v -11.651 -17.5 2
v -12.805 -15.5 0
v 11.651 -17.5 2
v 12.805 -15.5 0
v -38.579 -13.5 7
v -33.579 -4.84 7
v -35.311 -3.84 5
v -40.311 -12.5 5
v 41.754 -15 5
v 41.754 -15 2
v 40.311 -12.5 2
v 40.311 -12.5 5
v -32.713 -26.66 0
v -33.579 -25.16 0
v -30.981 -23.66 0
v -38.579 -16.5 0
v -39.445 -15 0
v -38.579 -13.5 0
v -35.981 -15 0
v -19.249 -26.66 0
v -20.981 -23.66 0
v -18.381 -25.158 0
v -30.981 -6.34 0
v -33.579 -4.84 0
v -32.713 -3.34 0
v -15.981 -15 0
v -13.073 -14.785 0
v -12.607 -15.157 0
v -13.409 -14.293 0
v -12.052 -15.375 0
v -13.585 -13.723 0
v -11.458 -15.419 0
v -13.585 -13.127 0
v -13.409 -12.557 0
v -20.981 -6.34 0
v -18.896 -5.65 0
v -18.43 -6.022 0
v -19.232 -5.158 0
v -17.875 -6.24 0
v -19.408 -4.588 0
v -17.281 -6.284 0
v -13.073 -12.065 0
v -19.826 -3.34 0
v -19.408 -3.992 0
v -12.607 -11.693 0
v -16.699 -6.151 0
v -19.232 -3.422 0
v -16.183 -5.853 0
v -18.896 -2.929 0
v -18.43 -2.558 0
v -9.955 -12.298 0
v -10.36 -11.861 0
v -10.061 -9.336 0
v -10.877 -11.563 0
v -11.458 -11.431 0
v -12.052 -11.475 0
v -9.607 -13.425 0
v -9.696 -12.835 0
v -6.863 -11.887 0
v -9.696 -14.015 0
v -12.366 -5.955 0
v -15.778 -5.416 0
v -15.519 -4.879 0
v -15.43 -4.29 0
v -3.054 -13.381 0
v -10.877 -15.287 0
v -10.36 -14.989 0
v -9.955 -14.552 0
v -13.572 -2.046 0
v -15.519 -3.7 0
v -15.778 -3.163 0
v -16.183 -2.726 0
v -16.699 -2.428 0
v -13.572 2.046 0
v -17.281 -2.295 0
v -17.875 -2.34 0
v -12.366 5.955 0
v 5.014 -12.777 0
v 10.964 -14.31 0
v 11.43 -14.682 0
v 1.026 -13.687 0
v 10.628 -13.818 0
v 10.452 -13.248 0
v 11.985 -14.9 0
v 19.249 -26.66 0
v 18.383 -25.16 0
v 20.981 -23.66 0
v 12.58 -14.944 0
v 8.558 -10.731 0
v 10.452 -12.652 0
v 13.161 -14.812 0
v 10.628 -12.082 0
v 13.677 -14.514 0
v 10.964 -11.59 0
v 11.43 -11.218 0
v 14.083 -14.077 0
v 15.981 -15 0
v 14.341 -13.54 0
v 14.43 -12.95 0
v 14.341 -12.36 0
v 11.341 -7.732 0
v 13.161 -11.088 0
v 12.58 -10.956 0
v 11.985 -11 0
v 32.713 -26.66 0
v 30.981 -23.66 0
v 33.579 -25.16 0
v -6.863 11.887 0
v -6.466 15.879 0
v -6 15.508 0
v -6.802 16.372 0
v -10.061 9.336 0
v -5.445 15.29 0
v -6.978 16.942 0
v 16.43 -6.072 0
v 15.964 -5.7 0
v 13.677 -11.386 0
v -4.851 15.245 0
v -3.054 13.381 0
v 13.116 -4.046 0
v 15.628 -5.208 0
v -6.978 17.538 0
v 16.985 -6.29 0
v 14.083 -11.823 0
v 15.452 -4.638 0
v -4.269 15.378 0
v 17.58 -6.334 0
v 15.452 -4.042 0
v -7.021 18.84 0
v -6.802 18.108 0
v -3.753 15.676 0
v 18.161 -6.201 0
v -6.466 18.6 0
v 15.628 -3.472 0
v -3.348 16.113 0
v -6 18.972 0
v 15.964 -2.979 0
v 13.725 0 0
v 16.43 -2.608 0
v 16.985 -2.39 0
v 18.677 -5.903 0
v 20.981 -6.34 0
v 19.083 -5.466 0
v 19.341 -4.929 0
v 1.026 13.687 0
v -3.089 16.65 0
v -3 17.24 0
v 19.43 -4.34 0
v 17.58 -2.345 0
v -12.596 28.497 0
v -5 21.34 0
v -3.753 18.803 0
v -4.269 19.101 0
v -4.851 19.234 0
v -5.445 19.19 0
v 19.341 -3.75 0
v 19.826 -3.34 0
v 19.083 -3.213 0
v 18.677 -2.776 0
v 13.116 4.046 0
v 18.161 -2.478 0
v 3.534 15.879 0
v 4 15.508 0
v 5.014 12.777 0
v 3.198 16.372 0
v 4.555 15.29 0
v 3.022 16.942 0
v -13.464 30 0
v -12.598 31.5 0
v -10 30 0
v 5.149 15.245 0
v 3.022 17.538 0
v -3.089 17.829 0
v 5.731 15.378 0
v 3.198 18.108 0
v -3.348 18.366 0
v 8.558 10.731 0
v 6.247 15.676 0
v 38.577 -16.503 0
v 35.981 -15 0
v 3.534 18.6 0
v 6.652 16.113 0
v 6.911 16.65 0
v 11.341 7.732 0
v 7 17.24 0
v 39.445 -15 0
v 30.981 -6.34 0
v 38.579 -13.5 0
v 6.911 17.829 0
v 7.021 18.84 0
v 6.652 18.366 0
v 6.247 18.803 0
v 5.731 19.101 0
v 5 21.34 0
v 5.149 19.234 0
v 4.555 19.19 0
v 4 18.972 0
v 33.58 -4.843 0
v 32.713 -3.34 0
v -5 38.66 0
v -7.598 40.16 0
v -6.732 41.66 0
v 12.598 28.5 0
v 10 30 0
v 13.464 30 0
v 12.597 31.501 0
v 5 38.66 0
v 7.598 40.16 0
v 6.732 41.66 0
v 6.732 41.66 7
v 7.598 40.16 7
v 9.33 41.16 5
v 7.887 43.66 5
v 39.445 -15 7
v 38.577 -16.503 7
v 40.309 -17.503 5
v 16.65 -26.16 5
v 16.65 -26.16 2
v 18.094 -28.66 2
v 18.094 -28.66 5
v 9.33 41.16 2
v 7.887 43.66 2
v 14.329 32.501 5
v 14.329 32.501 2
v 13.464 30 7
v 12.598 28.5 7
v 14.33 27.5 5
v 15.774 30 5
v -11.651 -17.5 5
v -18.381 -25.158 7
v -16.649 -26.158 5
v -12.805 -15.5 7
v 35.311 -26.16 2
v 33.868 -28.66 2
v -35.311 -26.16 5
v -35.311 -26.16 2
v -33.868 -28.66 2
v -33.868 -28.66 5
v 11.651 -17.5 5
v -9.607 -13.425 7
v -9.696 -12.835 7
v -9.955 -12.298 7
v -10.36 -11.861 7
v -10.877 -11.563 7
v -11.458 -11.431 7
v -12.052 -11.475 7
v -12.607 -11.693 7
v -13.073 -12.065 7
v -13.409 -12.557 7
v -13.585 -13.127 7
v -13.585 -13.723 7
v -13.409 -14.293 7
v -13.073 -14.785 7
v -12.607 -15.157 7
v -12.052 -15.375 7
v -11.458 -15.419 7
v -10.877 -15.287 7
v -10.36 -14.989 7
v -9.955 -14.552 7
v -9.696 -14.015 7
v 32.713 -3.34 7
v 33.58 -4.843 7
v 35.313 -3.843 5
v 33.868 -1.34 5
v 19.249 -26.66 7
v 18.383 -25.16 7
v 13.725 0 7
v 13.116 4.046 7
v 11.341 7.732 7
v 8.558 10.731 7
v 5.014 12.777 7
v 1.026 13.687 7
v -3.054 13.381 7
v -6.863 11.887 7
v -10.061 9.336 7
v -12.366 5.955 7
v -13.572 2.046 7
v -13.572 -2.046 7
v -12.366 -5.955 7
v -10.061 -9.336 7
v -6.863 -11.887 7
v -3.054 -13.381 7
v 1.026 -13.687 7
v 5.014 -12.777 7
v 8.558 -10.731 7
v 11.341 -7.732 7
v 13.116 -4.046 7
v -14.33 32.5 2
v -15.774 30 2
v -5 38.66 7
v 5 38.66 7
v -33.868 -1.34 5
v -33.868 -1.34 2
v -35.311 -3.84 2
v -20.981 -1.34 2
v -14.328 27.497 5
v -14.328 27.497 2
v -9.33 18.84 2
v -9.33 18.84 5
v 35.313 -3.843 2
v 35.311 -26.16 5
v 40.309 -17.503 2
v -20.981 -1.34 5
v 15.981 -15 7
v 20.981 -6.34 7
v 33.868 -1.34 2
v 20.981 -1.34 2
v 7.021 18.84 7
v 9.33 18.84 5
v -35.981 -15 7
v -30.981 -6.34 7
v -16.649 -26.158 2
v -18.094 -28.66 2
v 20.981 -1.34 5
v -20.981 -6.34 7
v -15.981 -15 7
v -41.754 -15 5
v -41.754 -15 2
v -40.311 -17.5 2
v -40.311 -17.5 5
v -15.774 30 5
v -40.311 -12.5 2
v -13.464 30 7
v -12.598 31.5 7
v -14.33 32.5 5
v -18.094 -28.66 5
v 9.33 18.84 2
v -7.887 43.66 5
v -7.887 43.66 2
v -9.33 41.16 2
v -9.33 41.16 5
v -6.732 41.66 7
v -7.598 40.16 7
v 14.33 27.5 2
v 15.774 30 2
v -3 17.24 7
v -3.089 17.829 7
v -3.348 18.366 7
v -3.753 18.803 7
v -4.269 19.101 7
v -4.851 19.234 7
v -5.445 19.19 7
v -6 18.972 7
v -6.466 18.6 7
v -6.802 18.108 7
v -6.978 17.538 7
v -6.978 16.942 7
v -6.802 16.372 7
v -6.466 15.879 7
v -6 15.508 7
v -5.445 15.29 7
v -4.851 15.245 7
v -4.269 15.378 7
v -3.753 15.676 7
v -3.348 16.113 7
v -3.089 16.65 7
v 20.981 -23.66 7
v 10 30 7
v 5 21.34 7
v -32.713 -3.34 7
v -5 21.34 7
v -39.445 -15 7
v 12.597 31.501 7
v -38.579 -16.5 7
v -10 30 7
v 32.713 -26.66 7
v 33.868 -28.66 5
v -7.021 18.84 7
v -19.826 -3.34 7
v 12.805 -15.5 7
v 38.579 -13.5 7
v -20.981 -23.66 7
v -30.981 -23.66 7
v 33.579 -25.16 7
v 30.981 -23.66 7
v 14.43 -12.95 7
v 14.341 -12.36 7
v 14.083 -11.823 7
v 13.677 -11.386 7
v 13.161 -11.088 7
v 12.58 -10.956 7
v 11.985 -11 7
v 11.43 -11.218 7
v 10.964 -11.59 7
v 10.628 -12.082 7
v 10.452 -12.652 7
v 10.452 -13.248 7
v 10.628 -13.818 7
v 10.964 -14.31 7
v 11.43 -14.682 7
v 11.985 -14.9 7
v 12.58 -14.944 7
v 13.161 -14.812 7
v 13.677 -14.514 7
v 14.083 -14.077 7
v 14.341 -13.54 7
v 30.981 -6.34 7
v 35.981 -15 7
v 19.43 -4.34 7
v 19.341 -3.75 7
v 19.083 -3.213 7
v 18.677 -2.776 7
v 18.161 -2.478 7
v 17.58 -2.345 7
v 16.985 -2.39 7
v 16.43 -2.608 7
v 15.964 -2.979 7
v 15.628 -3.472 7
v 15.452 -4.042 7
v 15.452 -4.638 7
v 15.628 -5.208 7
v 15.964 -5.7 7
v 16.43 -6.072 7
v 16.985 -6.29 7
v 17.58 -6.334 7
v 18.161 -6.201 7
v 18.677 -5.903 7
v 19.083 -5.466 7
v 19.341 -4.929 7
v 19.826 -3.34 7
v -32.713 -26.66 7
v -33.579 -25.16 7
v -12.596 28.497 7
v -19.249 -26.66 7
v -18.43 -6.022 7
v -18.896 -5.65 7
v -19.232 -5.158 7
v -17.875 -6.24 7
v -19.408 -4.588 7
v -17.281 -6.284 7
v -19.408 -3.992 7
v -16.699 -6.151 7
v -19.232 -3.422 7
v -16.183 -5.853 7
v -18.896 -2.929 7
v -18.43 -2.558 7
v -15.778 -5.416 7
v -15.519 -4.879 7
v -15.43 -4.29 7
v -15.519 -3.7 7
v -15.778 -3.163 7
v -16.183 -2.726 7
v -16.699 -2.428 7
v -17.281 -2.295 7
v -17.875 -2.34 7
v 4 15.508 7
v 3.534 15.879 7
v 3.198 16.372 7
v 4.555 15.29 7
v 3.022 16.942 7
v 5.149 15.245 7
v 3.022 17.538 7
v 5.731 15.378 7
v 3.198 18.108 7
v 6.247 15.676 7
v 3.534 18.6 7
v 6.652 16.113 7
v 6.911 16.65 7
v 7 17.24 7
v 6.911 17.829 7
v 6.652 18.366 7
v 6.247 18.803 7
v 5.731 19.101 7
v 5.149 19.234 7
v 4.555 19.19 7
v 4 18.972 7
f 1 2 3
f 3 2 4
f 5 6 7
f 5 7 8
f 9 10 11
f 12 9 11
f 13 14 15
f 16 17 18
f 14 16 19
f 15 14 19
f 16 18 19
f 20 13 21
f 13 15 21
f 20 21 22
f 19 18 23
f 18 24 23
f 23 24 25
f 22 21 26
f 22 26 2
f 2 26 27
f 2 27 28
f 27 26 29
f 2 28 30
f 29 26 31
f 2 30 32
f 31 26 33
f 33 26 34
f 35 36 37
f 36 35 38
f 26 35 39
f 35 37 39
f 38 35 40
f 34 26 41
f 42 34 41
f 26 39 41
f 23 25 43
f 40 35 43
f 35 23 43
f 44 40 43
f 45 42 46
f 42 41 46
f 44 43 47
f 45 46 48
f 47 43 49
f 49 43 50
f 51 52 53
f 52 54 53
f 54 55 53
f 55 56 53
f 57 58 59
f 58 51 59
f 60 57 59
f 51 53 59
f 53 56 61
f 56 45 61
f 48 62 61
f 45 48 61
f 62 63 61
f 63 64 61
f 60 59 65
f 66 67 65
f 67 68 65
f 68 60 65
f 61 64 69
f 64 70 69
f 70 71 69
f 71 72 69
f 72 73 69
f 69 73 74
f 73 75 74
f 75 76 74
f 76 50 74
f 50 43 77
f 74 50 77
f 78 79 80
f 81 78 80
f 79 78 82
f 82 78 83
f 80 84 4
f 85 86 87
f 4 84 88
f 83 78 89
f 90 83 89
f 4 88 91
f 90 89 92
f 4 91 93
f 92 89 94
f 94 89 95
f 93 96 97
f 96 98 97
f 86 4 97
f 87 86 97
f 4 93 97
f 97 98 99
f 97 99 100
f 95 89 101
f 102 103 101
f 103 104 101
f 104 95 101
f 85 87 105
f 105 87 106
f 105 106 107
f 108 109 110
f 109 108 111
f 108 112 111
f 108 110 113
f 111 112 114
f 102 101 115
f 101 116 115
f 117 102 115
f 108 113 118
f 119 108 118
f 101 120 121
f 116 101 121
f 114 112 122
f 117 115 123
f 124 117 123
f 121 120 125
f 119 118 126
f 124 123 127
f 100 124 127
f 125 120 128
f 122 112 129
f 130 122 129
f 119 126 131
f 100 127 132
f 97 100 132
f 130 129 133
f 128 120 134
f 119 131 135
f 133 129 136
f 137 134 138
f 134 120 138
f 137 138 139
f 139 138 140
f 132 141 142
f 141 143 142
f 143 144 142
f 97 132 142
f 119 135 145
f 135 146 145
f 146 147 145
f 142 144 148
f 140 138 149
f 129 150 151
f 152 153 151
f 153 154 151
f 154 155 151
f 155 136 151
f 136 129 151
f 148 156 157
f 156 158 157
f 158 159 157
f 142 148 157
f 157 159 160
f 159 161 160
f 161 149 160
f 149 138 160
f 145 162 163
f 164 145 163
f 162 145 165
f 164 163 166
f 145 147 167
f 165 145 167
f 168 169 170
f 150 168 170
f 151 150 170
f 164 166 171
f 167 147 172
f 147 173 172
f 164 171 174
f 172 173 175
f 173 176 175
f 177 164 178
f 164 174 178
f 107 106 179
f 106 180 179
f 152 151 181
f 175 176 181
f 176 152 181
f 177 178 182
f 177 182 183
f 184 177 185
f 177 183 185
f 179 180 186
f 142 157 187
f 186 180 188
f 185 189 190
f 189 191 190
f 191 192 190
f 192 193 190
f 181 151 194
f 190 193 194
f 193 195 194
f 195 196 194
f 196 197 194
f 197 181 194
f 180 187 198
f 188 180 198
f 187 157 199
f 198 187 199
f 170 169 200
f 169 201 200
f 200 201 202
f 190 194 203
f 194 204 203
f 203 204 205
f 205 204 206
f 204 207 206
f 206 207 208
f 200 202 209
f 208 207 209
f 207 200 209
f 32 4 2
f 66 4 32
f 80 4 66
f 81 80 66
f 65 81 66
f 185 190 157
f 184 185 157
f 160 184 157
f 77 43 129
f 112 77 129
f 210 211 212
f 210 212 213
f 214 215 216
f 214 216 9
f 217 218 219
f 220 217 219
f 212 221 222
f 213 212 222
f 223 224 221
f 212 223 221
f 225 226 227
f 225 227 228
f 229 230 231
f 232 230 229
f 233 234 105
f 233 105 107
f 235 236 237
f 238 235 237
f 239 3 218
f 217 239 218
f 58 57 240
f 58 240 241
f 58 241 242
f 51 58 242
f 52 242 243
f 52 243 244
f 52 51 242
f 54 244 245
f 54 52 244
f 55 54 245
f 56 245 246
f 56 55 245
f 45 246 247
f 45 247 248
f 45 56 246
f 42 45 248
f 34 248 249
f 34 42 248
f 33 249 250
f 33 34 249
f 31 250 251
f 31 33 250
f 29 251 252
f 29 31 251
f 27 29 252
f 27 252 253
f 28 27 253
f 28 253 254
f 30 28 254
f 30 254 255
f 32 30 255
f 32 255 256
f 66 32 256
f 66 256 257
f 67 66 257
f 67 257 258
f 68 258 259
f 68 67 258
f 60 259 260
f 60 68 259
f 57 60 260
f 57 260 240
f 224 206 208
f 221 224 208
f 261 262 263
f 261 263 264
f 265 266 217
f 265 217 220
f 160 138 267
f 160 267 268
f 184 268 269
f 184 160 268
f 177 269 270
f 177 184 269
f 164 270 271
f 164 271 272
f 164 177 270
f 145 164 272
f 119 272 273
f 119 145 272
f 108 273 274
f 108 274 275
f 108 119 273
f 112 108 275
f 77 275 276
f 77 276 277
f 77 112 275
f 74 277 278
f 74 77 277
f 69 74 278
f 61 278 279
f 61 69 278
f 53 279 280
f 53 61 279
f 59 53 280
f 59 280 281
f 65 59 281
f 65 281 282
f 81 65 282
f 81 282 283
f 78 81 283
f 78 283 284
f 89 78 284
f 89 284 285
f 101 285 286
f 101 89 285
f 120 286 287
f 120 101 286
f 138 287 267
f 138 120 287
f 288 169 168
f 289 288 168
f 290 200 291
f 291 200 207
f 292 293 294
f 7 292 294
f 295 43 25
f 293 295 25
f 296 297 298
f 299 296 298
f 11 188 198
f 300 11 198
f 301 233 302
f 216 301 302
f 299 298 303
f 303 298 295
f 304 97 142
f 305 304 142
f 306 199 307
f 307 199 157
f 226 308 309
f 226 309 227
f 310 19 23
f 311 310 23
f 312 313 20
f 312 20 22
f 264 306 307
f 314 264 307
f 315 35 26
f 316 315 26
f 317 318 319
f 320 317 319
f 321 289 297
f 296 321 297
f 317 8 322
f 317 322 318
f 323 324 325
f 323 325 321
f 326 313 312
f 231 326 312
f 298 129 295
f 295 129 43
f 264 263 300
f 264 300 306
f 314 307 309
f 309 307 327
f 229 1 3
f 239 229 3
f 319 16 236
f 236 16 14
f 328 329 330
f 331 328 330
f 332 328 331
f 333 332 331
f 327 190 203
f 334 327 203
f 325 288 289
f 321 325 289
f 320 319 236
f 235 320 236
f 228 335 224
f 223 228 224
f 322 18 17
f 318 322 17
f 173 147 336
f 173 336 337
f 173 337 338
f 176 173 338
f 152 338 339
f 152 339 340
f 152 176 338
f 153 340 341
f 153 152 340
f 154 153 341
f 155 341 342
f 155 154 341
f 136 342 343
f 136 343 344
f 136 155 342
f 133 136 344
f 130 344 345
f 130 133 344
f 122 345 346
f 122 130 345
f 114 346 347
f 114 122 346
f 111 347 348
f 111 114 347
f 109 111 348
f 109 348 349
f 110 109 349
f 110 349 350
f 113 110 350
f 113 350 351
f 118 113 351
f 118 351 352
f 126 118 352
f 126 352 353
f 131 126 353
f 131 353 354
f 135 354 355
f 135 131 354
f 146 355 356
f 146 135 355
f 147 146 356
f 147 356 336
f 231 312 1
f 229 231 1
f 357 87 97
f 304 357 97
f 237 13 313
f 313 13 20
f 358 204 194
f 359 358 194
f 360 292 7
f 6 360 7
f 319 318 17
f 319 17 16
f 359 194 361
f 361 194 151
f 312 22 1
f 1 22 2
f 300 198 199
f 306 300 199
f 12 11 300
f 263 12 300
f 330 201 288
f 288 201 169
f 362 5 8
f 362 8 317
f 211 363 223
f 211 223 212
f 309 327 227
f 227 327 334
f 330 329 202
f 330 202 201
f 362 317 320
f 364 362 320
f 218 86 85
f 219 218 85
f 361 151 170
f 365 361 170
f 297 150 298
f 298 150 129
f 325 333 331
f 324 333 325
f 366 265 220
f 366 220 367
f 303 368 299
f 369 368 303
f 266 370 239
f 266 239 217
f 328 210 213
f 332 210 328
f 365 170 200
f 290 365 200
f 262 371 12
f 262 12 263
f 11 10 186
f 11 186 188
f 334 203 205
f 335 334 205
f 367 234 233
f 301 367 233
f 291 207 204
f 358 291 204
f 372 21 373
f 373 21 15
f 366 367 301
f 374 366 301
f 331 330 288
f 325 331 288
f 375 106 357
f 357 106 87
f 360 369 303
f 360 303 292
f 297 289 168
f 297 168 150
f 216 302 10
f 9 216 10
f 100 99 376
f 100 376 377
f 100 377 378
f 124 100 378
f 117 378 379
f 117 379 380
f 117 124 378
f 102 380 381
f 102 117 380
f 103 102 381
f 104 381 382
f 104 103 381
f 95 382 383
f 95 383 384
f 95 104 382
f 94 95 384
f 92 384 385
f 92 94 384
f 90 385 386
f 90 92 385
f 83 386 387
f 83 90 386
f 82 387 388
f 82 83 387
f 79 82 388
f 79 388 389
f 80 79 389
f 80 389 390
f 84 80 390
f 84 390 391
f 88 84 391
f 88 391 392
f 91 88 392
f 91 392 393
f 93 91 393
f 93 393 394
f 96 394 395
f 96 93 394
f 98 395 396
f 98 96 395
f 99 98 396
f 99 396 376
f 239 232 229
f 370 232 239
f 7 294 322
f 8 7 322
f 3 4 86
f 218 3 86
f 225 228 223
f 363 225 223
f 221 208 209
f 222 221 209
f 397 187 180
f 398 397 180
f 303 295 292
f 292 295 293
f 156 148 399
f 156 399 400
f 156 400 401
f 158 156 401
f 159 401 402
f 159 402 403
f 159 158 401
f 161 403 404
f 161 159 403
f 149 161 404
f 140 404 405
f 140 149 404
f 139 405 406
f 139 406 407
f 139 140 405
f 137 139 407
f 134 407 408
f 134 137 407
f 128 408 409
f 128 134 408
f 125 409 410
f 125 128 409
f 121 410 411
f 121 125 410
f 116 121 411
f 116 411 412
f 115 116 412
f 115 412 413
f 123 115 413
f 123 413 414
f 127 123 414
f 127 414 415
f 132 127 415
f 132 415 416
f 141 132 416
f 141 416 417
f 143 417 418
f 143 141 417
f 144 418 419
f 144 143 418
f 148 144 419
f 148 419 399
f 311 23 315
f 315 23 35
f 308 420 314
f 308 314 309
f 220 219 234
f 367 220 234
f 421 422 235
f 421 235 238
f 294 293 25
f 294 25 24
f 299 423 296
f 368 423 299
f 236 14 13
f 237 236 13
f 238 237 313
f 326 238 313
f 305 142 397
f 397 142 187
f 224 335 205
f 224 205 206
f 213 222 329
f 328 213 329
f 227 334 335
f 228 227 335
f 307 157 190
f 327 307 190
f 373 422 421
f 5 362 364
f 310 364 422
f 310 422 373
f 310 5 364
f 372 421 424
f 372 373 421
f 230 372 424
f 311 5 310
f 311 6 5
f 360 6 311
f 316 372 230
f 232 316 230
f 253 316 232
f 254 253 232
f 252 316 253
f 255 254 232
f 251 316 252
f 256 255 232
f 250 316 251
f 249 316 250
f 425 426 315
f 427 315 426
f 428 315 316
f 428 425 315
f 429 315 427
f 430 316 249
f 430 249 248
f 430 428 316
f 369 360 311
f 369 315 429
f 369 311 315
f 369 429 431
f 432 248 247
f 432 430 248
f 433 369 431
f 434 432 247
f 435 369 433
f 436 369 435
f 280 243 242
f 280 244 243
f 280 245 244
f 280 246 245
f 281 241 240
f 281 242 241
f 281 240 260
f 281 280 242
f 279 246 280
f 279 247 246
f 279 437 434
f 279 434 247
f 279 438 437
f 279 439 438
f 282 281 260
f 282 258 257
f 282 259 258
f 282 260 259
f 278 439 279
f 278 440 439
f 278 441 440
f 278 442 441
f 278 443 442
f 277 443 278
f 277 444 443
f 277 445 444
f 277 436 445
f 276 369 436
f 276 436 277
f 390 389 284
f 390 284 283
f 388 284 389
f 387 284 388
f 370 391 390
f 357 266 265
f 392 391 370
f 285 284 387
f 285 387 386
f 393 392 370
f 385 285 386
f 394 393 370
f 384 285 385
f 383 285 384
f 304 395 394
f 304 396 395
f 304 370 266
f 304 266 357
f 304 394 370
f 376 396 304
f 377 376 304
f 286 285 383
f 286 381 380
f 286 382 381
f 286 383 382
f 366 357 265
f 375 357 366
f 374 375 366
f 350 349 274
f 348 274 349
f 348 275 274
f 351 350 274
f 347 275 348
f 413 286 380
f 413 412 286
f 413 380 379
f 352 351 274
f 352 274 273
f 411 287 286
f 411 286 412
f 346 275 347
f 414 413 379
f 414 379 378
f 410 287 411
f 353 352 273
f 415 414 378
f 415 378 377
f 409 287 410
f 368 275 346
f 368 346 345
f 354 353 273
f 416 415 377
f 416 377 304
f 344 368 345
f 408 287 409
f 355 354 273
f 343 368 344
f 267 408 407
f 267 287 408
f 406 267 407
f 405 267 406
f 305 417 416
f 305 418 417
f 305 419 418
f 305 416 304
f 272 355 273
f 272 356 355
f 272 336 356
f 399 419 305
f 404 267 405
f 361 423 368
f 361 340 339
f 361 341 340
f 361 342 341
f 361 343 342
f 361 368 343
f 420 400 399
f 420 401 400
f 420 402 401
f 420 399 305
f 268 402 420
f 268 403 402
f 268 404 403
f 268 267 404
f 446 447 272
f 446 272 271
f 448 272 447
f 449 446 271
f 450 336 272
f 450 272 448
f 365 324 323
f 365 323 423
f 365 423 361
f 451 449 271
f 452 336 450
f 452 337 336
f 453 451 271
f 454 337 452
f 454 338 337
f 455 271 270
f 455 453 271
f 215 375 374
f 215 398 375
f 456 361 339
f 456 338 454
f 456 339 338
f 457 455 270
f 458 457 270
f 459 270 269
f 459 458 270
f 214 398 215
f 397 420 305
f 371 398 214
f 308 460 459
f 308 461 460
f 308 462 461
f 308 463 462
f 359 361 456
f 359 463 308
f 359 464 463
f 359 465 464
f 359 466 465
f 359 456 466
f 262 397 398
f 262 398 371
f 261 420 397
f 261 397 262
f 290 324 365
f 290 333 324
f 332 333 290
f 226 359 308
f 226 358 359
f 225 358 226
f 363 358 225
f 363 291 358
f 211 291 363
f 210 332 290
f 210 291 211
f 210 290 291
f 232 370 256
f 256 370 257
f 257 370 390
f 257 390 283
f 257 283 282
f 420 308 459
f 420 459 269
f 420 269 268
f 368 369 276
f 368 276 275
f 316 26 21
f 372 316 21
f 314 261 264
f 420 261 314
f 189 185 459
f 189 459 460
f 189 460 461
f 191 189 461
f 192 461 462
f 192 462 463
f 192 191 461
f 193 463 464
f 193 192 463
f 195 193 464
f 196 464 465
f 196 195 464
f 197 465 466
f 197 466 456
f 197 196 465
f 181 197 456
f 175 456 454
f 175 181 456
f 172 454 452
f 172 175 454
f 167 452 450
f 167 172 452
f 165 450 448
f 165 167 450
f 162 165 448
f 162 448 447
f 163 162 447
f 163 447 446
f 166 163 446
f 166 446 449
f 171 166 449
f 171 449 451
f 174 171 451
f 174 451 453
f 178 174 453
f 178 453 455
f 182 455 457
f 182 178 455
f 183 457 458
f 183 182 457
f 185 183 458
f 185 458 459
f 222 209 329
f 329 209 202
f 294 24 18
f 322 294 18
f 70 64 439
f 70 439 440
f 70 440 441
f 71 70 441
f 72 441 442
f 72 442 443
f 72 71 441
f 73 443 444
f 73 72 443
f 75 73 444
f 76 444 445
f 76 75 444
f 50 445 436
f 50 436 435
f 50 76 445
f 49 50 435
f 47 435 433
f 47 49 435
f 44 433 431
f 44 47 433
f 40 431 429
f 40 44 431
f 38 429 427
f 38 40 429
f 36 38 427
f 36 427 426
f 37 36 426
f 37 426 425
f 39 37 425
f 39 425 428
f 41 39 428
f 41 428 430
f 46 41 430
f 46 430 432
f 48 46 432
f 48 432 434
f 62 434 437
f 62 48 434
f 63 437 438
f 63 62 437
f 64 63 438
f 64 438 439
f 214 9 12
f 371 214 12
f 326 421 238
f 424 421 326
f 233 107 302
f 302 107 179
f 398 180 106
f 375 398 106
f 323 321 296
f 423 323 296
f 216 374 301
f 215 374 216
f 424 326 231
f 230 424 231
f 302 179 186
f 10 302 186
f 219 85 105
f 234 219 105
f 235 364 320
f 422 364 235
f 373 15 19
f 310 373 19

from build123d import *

# Parameters (mm, degrees)
F0_R     = 2
F0_R_2   = 13.725453
F1_DEPTH = 7
F2_SIZE  = 2


with BuildPart() as f1:
    # F0 (on Top) → F1 (new body)
    with BuildSketch(Plane.XY):
        Polygon((5, 43.660253), (-5, 43.660253), (-7.886752, 43.660253), (-9.330152, 41.160211), (-14.330019, 32.500187), (-15.773503, 30), (-14.328388, 27.496988), (-9.330127, 18.839746), (-20.980762, -1.339746), (-30.980762, -1.339746), (-33.867513, -1.339746), (-35.310889, -3.839746), (-40.310889, -12.5), (-41.754264, -15), (-40.310888, -17.499999), (-35.310888, -26.160254), (-33.867512, -28.660255), (-30.980762, -28.660255), (-20.980762, -28.660255), (-18.094012, -28.660255), (-16.649425, -26.158157), (-11.650635, -17.5), (11.650635, -17.5), (16.650482, -26.159988), (18.094012, -28.660255), (20.980762, -28.660255), (30.980762, -28.660255), (33.867512, -28.660255), (35.310888, -26.160254), (40.309298, -17.502755), (41.754264, -15), (40.310625, -12.499543), (35.312513, -3.84256), (33.867513, -1.339746), (30.980762, -1.339746), (20.980762, -1.339746), (9.330127, 18.839746), (14.330123, 27.499994), (15.773503, 30), (14.329358, 32.501332), (9.330202, 41.160124), (7.886752, 43.660253), align=None)
        Polygon((-30.980762, -6.339746), (-20.980762, -6.339746), (-15.980762, -15), (-20.980762, -23.660254), (-30.980762, -23.660254), (-35.980762, -15), align=None, mode=Mode.SUBTRACT)
        with Locations((-11.607334, -13.425)):
            Circle(F0_R, mode=Mode.SUBTRACT)
        with Locations((-17.430058, -4.289746)):
            Circle(F0_R, mode=Mode.SUBTRACT)
        Circle(F0_R_2, mode=Mode.SUBTRACT)
        with Locations((12.430058, -12.95)):
            Circle(F0_R, mode=Mode.SUBTRACT)
        Polygon((20.980762, -23.660254), (15.980762, -15), (20.980762, -6.339746), (30.980762, -6.339746), (35.980762, -15), (30.980762, -23.660254), align=None, mode=Mode.SUBTRACT)
        with Locations((17.430058, -4.339746)):
            Circle(F0_R, mode=Mode.SUBTRACT)
        with Locations((-5, 17.239746)):
            Circle(F0_R, mode=Mode.SUBTRACT)
        Polygon((10, 30), (5, 21.339746), (-5, 21.339746), (-10, 30), (-5, 38.660254), (5, 38.660254), align=None, mode=Mode.SUBTRACT)
        with Locations((5, 17.239746)):
            Circle(F0_R, mode=Mode.SUBTRACT)
    extrude(amount=F1_DEPTH)

    # F2
    f2_edges = [f1.edges().sort_by_distance(p)[0] for p in [
        (-11.830127, 36.830127, 7),
        (0, 43.660253, 7),
        (-12.551815, 24.419873, 7),
        (11.830127, 36.830127, 7),
        (12.551815, 24.419873, 7),
        (15.155444, 8.75, 7),
        (27.424137, -1.339746, 7),
        (37.810888, -8.169873, 7),
        (37.810888, -21.830127, 7),
        (25.980762, -28.660255, 7),
        (14.872323, -23.080127, 7),
        (0, -17.5, 7),
        (-14.872323, -23.080127, 7),
        (-25.980762, -28.660255, 7),
        (-37.810888, -21.830127, 7),
        (-37.810888, -8.169873, 7),
        (-27.424137, -1.339746, 7),
        (-15.155444, 8.75, 7),
        (-27.424137, -1.339746, 0),
        (-37.810888, -8.169873, 0),
        (-37.810888, -21.830127, 0),
        (-25.980762, -28.660255, 0),
        (-14.872323, -23.080127, 0),
        (0, -17.5, 0),
        (14.872323, -23.080127, 0),
        (25.980762, -28.660255, 0),
        (37.810888, -21.830127, 0),
        (37.810888, -8.169873, 0),
        (27.424137, -1.339746, 0),
        (15.155444, 8.75, 0),
        (12.551815, 24.419873, 0),
        (11.830127, 36.830127, 0),
        (0, 43.660253, 0),
        (-11.830127, 36.830127, 0),
        (-12.551815, 24.419873, 0),
        (-15.155444, 8.75, 0),
    ]]
    chamfer(f2_edges, length=F2_SIZE)


solid = f1.part
